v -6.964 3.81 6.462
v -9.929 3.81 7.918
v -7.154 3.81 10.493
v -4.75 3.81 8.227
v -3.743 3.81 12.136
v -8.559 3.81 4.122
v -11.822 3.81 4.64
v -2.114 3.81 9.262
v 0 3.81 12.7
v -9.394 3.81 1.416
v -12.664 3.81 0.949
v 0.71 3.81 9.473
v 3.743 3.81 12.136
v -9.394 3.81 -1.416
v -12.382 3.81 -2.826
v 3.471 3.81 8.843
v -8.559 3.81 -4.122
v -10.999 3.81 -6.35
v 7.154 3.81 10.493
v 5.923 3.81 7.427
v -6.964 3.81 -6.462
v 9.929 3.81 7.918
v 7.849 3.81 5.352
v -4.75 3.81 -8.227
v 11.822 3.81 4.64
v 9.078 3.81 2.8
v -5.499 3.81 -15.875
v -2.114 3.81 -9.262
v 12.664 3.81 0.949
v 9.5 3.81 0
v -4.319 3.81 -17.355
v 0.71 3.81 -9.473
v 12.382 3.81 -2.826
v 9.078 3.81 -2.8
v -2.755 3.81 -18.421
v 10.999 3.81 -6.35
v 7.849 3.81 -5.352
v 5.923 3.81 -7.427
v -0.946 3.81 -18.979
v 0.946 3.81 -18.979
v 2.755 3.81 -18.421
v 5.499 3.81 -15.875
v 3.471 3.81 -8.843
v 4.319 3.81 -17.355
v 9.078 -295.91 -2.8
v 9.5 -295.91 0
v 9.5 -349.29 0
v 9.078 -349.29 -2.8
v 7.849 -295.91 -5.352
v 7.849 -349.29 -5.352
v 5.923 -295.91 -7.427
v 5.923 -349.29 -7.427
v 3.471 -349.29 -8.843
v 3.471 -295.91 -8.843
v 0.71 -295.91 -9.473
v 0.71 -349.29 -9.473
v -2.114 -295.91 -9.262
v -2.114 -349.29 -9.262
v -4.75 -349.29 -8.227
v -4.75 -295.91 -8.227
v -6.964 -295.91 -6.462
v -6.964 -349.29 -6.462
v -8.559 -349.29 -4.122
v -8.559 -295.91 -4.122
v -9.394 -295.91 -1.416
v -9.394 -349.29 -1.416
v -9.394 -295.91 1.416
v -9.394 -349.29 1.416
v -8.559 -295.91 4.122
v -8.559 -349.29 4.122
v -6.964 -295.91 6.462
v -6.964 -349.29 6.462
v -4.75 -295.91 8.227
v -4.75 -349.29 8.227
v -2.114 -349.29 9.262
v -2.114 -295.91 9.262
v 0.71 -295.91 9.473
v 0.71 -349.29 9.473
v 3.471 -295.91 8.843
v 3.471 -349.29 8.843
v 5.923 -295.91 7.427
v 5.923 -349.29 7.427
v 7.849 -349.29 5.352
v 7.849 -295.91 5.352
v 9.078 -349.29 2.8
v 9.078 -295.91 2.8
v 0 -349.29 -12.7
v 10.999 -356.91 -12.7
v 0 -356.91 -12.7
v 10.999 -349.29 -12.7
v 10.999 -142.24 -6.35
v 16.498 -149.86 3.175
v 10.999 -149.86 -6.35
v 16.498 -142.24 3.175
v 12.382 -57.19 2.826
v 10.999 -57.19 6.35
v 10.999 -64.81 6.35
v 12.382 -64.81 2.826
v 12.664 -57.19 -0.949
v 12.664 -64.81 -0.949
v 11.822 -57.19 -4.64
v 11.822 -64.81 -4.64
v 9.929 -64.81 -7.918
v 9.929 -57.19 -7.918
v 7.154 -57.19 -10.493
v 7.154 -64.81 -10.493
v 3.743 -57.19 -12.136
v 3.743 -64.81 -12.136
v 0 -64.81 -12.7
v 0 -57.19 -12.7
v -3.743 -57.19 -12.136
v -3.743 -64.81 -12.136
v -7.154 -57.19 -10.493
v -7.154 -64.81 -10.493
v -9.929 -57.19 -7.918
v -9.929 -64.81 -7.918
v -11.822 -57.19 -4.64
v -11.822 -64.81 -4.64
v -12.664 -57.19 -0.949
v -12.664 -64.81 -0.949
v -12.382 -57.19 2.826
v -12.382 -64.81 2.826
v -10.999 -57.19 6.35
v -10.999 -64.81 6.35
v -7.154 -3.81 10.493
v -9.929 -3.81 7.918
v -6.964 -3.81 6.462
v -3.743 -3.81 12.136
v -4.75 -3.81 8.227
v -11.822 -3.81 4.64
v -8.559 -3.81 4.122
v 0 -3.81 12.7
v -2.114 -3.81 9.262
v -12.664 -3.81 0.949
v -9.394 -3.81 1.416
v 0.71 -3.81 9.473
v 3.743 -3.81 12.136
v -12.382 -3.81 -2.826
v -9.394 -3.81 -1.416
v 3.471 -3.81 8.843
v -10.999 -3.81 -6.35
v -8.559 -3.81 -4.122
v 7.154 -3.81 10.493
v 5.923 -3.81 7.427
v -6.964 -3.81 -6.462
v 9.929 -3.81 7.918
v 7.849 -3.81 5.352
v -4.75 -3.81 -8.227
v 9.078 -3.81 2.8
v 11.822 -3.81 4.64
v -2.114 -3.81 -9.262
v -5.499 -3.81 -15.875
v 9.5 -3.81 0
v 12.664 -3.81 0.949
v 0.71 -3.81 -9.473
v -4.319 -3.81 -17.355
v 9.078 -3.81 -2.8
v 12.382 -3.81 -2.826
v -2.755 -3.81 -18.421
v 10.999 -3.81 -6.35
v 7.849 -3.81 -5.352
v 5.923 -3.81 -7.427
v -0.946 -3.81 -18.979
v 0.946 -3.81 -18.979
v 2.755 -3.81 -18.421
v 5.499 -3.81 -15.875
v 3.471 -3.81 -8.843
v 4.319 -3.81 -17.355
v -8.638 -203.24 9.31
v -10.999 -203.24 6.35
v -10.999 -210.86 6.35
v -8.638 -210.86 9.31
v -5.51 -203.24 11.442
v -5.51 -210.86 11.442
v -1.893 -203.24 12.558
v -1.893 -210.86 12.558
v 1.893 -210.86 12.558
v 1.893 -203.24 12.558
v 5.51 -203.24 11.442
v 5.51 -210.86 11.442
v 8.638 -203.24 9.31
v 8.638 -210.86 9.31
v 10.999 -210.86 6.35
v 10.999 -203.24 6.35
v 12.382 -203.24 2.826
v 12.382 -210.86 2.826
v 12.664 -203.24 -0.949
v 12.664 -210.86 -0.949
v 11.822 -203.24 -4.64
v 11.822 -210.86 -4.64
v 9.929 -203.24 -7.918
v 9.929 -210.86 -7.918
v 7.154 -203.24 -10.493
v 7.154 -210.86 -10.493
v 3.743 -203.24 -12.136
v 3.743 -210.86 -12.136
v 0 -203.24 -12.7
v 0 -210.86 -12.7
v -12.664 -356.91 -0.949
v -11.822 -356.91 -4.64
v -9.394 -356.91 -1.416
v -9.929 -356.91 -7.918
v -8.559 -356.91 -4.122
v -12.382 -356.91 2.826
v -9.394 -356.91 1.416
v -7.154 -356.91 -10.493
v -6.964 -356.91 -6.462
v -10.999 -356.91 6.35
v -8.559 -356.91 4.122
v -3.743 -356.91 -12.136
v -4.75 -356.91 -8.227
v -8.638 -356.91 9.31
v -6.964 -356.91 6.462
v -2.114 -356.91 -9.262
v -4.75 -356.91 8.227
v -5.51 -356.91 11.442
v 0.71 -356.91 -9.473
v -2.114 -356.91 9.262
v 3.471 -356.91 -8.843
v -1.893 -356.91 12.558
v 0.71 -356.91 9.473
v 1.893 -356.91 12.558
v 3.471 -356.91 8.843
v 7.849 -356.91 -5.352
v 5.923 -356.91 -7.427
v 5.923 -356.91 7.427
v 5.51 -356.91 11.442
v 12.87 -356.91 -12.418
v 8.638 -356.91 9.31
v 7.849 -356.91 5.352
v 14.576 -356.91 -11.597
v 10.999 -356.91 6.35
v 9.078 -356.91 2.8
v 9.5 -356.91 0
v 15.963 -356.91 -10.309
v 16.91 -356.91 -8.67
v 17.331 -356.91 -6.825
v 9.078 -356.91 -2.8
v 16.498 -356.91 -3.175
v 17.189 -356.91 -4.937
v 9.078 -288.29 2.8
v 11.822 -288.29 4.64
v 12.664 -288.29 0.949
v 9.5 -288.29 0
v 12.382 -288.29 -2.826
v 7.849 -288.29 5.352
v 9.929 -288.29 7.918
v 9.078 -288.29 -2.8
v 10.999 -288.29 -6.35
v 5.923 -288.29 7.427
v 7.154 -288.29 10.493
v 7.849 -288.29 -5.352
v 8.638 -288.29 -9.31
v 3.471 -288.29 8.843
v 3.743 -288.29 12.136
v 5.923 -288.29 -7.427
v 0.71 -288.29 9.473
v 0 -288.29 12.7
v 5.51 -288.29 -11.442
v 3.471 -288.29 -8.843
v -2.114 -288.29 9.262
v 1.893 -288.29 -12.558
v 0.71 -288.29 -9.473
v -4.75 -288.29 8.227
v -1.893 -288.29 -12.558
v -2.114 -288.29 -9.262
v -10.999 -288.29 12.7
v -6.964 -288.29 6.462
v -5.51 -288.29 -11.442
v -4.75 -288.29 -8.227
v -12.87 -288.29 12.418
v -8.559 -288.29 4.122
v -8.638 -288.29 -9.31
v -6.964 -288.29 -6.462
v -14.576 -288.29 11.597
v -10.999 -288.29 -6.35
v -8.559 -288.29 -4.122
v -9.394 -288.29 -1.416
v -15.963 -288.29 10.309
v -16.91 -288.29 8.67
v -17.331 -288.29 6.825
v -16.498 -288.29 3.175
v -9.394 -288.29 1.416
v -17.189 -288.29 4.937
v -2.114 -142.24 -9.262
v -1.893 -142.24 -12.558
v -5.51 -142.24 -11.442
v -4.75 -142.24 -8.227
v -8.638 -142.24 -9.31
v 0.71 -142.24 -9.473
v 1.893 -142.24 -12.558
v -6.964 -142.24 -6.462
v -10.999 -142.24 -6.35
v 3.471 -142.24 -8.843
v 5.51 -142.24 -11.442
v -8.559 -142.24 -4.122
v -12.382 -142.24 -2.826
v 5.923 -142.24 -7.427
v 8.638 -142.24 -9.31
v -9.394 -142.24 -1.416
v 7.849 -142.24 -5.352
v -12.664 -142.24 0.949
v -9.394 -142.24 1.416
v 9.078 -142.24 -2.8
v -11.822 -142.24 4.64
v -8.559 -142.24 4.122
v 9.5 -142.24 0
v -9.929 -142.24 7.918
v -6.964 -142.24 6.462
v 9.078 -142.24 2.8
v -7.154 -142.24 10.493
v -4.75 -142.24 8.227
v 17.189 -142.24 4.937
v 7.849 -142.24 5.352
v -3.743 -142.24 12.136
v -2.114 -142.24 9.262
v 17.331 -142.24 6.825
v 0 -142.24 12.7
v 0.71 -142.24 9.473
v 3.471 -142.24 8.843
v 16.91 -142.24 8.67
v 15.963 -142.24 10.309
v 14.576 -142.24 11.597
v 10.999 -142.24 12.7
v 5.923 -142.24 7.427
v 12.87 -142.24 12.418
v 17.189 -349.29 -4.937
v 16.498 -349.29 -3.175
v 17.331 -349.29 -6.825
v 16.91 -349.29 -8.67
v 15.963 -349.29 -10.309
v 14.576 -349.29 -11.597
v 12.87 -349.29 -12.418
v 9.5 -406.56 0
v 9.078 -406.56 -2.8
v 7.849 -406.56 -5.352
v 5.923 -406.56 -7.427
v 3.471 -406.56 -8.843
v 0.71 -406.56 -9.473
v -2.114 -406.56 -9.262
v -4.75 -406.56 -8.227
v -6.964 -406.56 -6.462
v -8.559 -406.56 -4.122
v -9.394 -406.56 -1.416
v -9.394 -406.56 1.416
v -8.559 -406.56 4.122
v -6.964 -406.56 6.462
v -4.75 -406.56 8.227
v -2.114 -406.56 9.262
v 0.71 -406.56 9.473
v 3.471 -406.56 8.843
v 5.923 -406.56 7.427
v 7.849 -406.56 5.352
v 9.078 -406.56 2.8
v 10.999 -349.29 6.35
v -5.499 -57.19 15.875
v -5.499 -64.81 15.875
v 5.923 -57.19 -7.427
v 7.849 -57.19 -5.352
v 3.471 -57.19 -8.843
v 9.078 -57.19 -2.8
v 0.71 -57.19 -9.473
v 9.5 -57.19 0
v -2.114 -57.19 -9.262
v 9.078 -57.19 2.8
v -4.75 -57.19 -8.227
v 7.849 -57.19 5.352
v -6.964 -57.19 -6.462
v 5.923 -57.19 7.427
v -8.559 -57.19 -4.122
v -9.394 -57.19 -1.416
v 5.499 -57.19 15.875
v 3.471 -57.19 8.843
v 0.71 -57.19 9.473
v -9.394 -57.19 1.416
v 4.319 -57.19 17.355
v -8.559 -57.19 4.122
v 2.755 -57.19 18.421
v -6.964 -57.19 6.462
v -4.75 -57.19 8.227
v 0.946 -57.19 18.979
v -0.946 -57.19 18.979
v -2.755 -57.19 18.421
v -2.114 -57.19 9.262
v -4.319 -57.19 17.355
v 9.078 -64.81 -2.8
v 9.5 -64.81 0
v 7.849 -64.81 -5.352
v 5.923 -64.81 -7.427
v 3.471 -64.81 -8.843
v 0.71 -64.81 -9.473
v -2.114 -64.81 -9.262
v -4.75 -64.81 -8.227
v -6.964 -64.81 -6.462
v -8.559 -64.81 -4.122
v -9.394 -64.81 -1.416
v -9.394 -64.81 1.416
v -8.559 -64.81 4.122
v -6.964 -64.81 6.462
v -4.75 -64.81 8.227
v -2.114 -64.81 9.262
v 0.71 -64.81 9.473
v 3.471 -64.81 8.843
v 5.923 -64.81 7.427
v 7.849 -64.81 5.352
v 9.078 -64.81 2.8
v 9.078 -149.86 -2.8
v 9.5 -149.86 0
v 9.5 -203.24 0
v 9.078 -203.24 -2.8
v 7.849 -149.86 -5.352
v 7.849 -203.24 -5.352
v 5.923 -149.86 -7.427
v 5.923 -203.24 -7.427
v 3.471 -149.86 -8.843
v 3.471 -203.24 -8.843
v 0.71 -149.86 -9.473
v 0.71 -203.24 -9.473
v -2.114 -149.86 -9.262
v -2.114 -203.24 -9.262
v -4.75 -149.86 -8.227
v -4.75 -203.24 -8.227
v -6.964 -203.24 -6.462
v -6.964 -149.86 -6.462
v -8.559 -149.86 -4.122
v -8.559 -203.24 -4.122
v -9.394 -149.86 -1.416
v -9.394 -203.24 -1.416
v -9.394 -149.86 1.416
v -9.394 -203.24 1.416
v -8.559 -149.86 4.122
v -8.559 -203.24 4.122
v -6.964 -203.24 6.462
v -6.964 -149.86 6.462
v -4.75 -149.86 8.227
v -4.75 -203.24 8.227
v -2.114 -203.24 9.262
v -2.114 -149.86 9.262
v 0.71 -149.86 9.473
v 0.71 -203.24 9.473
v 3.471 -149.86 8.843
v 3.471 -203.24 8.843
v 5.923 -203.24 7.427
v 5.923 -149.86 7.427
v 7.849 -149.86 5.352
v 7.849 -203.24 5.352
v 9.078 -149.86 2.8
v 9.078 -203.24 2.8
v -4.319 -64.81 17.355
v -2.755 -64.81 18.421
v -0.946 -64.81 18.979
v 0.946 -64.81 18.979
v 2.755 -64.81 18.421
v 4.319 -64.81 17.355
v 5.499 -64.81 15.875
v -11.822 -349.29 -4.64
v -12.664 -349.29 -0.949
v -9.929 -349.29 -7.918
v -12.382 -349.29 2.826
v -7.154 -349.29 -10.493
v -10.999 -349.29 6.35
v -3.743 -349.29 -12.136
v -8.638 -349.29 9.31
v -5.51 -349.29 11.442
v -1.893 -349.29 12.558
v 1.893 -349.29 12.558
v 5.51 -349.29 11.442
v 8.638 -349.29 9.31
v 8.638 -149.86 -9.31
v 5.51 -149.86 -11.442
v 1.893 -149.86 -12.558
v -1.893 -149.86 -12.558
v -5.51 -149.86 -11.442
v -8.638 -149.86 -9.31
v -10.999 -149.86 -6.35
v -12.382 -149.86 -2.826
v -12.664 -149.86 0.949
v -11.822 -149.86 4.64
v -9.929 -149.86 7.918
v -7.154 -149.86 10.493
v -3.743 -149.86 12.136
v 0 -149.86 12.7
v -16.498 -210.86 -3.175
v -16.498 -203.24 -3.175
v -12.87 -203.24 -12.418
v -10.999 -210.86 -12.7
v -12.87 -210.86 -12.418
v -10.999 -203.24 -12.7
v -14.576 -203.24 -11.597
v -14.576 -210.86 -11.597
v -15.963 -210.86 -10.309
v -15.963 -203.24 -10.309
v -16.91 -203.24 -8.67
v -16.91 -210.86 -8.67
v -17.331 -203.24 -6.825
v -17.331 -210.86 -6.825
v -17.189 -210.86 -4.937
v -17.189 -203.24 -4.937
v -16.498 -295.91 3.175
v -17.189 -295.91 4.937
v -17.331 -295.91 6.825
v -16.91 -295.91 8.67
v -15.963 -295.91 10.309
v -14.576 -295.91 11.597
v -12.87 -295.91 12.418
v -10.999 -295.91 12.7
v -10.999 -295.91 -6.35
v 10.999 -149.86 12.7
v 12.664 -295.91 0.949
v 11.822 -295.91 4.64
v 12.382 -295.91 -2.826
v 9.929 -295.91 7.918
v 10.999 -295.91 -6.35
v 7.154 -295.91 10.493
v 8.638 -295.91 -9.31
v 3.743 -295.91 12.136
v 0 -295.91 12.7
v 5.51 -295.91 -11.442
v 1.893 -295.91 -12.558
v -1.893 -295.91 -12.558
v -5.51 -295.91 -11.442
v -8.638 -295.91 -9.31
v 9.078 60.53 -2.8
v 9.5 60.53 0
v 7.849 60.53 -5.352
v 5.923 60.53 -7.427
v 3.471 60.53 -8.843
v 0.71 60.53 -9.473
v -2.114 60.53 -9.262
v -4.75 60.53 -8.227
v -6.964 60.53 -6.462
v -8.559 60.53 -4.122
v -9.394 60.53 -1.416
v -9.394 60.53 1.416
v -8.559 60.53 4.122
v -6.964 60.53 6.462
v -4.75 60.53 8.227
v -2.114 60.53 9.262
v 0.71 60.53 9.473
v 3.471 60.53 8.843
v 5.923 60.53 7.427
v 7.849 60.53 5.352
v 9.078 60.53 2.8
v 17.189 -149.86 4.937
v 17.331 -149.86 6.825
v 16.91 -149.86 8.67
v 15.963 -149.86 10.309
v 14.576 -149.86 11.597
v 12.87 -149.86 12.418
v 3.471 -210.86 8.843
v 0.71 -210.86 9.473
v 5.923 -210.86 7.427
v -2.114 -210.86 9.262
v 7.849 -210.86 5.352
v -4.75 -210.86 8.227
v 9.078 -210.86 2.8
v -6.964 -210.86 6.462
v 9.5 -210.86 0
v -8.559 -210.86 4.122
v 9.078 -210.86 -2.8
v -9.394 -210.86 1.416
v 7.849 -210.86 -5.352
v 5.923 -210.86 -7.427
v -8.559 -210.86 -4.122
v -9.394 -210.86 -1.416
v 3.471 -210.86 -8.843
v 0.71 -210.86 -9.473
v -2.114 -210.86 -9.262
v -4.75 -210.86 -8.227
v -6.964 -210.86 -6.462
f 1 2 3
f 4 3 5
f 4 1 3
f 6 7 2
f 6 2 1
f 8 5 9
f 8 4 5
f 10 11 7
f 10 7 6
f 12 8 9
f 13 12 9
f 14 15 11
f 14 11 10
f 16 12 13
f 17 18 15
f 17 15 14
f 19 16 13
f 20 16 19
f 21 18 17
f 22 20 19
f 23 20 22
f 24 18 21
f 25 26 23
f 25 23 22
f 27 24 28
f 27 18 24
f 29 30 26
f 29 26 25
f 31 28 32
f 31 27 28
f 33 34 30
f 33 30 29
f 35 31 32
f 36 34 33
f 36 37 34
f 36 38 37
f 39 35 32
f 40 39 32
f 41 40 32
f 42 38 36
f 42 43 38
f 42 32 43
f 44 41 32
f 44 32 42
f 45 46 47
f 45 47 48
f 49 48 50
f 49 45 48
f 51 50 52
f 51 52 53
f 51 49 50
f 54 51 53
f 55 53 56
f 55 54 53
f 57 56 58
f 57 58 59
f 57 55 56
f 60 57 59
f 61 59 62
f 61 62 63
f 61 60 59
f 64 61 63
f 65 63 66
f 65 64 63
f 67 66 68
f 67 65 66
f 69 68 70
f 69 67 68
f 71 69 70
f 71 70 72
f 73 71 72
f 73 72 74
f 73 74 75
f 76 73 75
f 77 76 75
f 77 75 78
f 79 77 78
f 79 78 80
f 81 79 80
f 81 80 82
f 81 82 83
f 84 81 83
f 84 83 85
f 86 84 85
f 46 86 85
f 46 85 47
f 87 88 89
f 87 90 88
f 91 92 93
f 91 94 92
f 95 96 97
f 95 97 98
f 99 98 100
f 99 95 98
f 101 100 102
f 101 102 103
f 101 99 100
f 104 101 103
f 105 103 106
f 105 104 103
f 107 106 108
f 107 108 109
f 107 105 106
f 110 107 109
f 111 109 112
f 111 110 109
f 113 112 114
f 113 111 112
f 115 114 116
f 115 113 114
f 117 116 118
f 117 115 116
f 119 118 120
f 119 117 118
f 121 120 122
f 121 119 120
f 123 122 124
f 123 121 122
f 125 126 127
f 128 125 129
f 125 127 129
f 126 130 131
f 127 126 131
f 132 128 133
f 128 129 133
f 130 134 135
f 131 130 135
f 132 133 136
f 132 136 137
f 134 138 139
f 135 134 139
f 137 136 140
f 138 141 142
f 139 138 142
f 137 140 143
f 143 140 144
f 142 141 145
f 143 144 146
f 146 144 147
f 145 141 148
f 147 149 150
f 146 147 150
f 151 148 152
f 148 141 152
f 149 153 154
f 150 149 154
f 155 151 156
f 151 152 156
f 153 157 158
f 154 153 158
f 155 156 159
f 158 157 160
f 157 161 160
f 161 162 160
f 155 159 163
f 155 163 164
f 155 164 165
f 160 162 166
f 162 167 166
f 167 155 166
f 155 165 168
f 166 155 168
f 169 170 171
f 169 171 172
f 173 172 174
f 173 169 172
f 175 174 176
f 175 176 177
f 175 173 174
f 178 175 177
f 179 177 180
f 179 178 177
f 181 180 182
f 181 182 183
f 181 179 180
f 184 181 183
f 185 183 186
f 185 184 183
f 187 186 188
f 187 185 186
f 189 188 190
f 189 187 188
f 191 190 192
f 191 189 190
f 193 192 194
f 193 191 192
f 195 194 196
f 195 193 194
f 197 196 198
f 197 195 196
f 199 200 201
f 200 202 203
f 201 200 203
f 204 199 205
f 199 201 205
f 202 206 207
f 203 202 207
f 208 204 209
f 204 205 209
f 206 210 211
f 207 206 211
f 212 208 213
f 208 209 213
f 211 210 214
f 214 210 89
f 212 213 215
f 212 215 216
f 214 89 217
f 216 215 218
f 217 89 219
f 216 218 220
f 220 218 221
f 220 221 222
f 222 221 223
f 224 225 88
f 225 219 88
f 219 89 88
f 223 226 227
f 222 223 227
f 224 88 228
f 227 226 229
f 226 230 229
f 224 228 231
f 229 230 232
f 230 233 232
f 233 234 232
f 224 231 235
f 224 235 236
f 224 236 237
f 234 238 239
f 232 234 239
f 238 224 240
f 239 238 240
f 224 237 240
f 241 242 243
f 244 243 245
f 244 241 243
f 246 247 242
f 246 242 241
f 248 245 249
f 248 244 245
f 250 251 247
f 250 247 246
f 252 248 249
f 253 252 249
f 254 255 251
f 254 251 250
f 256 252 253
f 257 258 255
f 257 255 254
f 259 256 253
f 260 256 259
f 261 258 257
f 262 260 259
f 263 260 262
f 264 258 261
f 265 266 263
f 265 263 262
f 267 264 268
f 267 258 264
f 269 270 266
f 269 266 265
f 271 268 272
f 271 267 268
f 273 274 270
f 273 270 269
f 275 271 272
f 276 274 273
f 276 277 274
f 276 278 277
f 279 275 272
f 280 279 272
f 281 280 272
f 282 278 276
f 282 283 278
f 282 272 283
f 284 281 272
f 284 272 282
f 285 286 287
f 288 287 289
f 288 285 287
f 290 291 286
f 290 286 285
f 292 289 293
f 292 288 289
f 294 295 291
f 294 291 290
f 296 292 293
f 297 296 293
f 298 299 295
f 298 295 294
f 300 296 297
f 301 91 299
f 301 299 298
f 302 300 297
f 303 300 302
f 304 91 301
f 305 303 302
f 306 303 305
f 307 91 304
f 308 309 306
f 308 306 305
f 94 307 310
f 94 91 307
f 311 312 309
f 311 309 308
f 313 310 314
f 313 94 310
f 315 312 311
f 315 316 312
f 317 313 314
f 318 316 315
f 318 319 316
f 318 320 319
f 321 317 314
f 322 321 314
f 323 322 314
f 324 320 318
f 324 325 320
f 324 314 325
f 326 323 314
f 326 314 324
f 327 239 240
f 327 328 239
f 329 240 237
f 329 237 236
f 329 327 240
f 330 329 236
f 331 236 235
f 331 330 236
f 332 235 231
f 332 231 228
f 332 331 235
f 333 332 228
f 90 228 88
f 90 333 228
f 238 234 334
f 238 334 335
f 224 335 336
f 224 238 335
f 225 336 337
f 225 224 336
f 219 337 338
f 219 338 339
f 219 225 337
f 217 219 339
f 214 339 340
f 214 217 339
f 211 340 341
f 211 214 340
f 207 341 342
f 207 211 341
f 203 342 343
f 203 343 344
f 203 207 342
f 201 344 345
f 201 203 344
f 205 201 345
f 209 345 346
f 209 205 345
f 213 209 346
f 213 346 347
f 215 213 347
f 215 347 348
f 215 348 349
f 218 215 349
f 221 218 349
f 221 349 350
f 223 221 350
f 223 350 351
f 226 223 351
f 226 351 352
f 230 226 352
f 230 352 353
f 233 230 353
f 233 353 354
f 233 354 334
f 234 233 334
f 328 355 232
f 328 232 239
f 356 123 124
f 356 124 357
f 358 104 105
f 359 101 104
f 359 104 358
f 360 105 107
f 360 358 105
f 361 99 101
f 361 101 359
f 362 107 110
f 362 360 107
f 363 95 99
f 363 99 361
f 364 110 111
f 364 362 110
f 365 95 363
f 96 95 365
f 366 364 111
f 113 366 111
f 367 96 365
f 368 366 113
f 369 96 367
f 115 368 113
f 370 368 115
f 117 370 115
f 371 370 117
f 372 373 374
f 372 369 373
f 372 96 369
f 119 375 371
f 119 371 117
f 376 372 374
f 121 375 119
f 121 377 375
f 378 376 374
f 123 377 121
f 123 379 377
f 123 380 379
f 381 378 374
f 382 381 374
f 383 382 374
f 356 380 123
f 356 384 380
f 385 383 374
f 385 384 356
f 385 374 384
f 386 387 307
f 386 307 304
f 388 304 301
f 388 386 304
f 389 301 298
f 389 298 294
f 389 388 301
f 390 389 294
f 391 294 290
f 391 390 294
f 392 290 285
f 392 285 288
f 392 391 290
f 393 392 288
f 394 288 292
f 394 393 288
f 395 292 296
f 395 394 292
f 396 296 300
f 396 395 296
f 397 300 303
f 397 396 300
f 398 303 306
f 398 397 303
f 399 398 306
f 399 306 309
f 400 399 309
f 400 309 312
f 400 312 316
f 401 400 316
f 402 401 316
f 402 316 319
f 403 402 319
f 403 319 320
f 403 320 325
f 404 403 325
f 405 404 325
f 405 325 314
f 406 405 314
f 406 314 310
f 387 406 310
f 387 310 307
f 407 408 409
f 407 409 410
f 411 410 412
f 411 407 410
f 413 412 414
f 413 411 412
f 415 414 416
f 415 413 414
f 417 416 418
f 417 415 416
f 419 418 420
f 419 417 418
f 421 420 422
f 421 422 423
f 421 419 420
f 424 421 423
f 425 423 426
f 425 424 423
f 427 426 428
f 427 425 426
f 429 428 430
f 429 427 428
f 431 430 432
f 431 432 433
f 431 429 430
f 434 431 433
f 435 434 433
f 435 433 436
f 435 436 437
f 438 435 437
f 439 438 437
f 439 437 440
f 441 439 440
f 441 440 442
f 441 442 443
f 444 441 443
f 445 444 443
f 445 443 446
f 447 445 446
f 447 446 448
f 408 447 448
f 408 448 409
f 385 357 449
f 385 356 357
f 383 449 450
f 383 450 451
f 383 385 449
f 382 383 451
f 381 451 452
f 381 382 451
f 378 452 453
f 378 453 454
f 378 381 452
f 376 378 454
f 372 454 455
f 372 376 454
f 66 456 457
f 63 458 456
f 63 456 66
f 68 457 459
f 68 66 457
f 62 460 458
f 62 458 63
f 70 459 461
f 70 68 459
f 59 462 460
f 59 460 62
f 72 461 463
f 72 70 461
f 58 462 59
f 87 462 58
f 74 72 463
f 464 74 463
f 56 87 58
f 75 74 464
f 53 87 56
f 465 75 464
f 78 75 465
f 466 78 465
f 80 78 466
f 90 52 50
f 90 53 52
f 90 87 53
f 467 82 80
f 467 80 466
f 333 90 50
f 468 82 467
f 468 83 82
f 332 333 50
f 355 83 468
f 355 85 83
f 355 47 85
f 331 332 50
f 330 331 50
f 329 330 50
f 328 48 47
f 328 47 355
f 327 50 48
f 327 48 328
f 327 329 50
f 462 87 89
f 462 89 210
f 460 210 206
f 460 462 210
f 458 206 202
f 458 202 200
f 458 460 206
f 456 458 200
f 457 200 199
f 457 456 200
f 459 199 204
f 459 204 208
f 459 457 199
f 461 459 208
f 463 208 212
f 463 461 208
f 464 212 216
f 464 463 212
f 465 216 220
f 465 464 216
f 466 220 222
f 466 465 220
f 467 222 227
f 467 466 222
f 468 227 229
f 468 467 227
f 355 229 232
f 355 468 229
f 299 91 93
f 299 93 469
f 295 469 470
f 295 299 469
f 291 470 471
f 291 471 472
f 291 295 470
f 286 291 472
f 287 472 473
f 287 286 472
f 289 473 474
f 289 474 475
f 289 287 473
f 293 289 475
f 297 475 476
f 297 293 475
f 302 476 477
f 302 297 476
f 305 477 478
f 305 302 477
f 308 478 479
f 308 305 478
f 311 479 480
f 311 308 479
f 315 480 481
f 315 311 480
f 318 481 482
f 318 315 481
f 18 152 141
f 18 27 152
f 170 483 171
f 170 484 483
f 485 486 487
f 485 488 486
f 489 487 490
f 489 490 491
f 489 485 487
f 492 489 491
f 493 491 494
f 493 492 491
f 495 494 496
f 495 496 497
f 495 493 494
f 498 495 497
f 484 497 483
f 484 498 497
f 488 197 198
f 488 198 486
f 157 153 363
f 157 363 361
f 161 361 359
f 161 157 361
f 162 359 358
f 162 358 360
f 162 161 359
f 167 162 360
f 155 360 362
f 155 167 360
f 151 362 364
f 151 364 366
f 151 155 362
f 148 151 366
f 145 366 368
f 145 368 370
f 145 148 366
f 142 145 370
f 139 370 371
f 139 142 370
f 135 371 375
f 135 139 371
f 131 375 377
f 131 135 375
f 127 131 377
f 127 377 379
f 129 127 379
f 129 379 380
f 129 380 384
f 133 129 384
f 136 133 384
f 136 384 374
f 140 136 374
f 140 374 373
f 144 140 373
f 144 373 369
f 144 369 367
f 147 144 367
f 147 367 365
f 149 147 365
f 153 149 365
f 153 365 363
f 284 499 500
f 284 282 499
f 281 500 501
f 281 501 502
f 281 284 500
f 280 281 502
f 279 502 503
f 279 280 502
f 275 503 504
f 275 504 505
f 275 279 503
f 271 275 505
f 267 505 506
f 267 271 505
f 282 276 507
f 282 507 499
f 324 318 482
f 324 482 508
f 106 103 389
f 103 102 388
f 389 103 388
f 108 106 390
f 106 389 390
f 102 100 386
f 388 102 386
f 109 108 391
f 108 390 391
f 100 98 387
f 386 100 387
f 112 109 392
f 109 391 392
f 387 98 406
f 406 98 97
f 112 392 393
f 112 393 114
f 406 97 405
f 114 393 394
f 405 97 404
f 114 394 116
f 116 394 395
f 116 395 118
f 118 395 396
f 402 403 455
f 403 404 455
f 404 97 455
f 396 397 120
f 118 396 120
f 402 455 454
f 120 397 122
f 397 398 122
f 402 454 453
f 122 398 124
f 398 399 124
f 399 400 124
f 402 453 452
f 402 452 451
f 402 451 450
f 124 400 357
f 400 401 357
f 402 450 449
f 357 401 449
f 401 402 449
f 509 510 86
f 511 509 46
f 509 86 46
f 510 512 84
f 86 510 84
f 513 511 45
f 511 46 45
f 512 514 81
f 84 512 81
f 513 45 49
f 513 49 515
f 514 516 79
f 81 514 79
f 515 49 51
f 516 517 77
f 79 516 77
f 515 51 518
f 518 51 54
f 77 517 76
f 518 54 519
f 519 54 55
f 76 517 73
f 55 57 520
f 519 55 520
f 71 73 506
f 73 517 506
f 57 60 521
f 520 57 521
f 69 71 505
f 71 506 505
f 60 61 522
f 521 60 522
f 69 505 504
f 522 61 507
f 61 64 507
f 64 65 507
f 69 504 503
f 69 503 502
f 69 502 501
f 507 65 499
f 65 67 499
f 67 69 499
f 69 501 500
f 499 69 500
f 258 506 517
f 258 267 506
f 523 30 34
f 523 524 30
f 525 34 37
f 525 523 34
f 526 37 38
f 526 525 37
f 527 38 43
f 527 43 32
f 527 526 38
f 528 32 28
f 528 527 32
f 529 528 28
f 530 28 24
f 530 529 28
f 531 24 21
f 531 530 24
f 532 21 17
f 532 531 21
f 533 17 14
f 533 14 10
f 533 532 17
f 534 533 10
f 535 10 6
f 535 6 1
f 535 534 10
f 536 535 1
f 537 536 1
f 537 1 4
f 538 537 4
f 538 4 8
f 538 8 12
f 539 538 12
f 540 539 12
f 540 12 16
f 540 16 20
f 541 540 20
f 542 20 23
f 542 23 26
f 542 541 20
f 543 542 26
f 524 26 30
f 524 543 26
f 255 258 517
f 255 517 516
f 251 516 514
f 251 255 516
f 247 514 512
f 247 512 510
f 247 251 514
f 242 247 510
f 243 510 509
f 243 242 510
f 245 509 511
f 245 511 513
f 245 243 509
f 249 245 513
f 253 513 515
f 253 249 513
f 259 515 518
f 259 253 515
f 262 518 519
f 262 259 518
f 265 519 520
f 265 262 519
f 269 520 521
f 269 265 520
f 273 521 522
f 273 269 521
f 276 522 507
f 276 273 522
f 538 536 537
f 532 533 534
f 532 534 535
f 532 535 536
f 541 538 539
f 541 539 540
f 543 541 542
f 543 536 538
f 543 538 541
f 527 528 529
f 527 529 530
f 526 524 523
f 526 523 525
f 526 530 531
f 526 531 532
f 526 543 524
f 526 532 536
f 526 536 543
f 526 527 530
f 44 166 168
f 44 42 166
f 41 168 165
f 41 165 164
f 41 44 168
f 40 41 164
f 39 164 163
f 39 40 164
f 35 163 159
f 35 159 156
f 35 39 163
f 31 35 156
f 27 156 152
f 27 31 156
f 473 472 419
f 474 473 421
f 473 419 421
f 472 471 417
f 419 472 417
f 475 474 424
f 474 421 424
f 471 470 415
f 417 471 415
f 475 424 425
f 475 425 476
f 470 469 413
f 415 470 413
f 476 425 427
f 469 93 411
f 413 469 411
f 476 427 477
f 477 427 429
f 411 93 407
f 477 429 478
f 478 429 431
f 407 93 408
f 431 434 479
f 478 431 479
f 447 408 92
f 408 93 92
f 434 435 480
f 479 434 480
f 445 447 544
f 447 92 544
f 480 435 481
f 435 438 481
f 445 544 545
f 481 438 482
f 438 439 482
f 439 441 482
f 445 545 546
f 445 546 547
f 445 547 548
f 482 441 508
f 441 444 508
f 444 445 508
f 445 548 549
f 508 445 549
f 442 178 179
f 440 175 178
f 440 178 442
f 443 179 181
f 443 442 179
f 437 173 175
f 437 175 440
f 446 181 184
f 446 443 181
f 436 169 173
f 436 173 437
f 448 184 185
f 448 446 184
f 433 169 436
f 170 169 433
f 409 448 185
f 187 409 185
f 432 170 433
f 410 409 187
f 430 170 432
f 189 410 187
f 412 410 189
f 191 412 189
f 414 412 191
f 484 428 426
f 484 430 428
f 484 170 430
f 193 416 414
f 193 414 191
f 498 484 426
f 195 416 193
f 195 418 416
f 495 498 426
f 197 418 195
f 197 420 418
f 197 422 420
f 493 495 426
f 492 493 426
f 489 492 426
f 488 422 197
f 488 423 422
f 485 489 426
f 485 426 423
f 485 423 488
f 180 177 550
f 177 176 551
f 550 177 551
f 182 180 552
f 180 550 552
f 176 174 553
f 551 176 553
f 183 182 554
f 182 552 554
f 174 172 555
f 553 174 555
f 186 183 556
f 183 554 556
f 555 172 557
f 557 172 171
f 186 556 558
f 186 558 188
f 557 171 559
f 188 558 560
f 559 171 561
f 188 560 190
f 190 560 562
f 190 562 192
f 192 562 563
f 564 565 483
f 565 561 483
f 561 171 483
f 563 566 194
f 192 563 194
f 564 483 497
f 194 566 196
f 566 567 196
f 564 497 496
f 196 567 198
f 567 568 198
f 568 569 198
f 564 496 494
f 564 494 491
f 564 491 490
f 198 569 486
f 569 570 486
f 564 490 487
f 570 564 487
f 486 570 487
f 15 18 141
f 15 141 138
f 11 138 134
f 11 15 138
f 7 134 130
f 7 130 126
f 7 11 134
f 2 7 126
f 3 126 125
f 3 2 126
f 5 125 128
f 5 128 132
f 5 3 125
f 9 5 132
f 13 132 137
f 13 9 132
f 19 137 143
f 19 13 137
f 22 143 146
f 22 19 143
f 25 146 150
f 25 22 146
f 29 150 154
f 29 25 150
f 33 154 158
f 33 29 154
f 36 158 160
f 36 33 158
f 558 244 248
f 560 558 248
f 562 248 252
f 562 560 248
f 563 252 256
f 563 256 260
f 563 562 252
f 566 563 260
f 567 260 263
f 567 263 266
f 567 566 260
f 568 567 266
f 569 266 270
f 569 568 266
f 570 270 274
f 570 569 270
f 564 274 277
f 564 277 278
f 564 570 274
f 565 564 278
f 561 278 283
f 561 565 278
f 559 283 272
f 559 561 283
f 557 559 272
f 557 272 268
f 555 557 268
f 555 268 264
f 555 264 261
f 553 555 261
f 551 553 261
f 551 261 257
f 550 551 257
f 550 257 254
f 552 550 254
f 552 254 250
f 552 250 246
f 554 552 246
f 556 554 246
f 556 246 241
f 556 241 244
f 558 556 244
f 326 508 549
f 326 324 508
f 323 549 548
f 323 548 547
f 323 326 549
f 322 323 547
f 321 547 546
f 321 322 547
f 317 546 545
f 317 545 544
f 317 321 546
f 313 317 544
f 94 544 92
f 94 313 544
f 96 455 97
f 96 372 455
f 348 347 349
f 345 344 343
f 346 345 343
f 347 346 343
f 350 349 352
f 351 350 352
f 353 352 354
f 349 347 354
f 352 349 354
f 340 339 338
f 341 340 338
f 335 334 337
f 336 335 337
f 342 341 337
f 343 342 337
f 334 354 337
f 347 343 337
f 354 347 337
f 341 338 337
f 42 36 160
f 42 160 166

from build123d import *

# Parameters (mm, degrees)
BOSS_EXTRUDE1_DEPTH      = 3.81
LPATTERN1_COUNT          = 2
LPATTERN1_PITCH          = 61
BODY_MOVE_COPY1_ANGLE    = 180
LPATTERN2_COUNT          = 3
LPATTERN2_PITCH          = 146.05
BODY_MOVE_COPY2_ANGLE    = 120
BODY_MOVE_COPY3_ANGLE    = 120
BOSS_EXTRUDE2_DEPTH      = 1
BOSS_EXTRUDE2_DEPTH_BACK = 466.09
BOSS_EXTRUDE2_START      = 59.53
SKETCH2_R                = 9.5


with BuildPart() as part:
    # Sketch1 → Boss-Extrude1 (new, symmetric)
    with BuildSketch(Plane(origin=(0, 0, 0), x_dir=(1, 0, 0), z_dir=(0, 1, 0))):
        with BuildLine():
            Line((-5.499261314, 15.875), (-10.998522628, 6.35))
            ThreePointArc((-10.998522628, 6.35), (0, -12.7), (10.998522628, 6.35))
            Line((10.998522628, 6.35), (5.499261314, 15.875))
            ThreePointArc((5.499261314, 15.875), (0, 19.05), (-5.499261314, 15.875))
        make_face()
    extrude(amount=BOSS_EXTRUDE1_DEPTH, both=True)


with BuildPart() as lpattern1_1:
    # LPattern1: pattern copy
    add(part.part.moved(Location(Vector(0, -1, 0) * (1 * LPATTERN1_PITCH))))


with BuildPart() as lpattern1_1_1:
    # Body-Move/Copy1: moved
    add(lpattern1_1.part.rotate(Axis((0, 0, 0), (0, 1, 0)), BODY_MOVE_COPY1_ANGLE))


with BuildPart() as lpattern2_1:
    # LPattern2: pattern copy
    add(part.part.moved(Location(Vector(0, -1, 0) * (1 * LPATTERN2_PITCH))))


with BuildPart() as lpattern2_2:
    # LPattern2: pattern copy
    add(part.part.moved(Location(Vector(0, -1, 0) * (2 * LPATTERN2_PITCH))))


with BuildPart() as lpattern2_3:
    # LPattern2: pattern copy
    add(lpattern1_1_1.part.moved(Location(Vector(0, -1, 0) * (1 * LPATTERN2_PITCH))))


with BuildPart() as lpattern2_4:
    # LPattern2: pattern copy
    add(lpattern1_1_1.part.moved(Location(Vector(0, -1, 0) * (2 * LPATTERN2_PITCH))))


with BuildPart() as lpattern2_1_1:
    # Body-Move/Copy2: moved
    add(lpattern2_1.part.rotate(Axis((0, 0, 0), (0, -1, 0)), BODY_MOVE_COPY2_ANGLE))


with BuildPart() as lpattern2_3_1:
    # Body-Move/Copy2: moved
    add(lpattern2_3.part.rotate(Axis((0, 0, 0), (0, -1, 0)), BODY_MOVE_COPY2_ANGLE))


with BuildPart() as lpattern2_2_1:
    # Body-Move/Copy3: moved
    add(lpattern2_2.part.rotate(Axis((0, 0, 0), (0, 1, 0)), BODY_MOVE_COPY3_ANGLE))


with BuildPart() as lpattern2_4_1:
    # Body-Move/Copy3: moved
    add(lpattern2_4.part.rotate(Axis((0, 0, 0), (0, 1, 0)), BODY_MOVE_COPY3_ANGLE))


with BuildPart() as part_1:
    add(part.part)

    add(lpattern1_1_1.part)  # Boss-Extrude2 merges LPattern1_1

    add(lpattern2_1_1.part)  # Boss-Extrude2 merges LPattern2_1

    add(lpattern2_2_1.part)  # Boss-Extrude2 merges LPattern2_2

    add(lpattern2_3_1.part)  # Boss-Extrude2 merges LPattern2_3

    add(lpattern2_4_1.part)  # Boss-Extrude2 merges LPattern2_4
    # Sketch2 → Boss-Extrude2 (add, two sides: drawn at the far end of the back side and taken through both)
    with BuildSketch(Plane(origin=(0, 0, 0), x_dir=(1, 0, 0), z_dir=(0, 1, 0)).offset(BOSS_EXTRUDE2_START - BOSS_EXTRUDE2_DEPTH_BACK)):
        Circle(SKETCH2_R)
    extrude(amount=BOSS_EXTRUDE2_DEPTH + BOSS_EXTRUDE2_DEPTH_BACK)


solid = part_1.part
